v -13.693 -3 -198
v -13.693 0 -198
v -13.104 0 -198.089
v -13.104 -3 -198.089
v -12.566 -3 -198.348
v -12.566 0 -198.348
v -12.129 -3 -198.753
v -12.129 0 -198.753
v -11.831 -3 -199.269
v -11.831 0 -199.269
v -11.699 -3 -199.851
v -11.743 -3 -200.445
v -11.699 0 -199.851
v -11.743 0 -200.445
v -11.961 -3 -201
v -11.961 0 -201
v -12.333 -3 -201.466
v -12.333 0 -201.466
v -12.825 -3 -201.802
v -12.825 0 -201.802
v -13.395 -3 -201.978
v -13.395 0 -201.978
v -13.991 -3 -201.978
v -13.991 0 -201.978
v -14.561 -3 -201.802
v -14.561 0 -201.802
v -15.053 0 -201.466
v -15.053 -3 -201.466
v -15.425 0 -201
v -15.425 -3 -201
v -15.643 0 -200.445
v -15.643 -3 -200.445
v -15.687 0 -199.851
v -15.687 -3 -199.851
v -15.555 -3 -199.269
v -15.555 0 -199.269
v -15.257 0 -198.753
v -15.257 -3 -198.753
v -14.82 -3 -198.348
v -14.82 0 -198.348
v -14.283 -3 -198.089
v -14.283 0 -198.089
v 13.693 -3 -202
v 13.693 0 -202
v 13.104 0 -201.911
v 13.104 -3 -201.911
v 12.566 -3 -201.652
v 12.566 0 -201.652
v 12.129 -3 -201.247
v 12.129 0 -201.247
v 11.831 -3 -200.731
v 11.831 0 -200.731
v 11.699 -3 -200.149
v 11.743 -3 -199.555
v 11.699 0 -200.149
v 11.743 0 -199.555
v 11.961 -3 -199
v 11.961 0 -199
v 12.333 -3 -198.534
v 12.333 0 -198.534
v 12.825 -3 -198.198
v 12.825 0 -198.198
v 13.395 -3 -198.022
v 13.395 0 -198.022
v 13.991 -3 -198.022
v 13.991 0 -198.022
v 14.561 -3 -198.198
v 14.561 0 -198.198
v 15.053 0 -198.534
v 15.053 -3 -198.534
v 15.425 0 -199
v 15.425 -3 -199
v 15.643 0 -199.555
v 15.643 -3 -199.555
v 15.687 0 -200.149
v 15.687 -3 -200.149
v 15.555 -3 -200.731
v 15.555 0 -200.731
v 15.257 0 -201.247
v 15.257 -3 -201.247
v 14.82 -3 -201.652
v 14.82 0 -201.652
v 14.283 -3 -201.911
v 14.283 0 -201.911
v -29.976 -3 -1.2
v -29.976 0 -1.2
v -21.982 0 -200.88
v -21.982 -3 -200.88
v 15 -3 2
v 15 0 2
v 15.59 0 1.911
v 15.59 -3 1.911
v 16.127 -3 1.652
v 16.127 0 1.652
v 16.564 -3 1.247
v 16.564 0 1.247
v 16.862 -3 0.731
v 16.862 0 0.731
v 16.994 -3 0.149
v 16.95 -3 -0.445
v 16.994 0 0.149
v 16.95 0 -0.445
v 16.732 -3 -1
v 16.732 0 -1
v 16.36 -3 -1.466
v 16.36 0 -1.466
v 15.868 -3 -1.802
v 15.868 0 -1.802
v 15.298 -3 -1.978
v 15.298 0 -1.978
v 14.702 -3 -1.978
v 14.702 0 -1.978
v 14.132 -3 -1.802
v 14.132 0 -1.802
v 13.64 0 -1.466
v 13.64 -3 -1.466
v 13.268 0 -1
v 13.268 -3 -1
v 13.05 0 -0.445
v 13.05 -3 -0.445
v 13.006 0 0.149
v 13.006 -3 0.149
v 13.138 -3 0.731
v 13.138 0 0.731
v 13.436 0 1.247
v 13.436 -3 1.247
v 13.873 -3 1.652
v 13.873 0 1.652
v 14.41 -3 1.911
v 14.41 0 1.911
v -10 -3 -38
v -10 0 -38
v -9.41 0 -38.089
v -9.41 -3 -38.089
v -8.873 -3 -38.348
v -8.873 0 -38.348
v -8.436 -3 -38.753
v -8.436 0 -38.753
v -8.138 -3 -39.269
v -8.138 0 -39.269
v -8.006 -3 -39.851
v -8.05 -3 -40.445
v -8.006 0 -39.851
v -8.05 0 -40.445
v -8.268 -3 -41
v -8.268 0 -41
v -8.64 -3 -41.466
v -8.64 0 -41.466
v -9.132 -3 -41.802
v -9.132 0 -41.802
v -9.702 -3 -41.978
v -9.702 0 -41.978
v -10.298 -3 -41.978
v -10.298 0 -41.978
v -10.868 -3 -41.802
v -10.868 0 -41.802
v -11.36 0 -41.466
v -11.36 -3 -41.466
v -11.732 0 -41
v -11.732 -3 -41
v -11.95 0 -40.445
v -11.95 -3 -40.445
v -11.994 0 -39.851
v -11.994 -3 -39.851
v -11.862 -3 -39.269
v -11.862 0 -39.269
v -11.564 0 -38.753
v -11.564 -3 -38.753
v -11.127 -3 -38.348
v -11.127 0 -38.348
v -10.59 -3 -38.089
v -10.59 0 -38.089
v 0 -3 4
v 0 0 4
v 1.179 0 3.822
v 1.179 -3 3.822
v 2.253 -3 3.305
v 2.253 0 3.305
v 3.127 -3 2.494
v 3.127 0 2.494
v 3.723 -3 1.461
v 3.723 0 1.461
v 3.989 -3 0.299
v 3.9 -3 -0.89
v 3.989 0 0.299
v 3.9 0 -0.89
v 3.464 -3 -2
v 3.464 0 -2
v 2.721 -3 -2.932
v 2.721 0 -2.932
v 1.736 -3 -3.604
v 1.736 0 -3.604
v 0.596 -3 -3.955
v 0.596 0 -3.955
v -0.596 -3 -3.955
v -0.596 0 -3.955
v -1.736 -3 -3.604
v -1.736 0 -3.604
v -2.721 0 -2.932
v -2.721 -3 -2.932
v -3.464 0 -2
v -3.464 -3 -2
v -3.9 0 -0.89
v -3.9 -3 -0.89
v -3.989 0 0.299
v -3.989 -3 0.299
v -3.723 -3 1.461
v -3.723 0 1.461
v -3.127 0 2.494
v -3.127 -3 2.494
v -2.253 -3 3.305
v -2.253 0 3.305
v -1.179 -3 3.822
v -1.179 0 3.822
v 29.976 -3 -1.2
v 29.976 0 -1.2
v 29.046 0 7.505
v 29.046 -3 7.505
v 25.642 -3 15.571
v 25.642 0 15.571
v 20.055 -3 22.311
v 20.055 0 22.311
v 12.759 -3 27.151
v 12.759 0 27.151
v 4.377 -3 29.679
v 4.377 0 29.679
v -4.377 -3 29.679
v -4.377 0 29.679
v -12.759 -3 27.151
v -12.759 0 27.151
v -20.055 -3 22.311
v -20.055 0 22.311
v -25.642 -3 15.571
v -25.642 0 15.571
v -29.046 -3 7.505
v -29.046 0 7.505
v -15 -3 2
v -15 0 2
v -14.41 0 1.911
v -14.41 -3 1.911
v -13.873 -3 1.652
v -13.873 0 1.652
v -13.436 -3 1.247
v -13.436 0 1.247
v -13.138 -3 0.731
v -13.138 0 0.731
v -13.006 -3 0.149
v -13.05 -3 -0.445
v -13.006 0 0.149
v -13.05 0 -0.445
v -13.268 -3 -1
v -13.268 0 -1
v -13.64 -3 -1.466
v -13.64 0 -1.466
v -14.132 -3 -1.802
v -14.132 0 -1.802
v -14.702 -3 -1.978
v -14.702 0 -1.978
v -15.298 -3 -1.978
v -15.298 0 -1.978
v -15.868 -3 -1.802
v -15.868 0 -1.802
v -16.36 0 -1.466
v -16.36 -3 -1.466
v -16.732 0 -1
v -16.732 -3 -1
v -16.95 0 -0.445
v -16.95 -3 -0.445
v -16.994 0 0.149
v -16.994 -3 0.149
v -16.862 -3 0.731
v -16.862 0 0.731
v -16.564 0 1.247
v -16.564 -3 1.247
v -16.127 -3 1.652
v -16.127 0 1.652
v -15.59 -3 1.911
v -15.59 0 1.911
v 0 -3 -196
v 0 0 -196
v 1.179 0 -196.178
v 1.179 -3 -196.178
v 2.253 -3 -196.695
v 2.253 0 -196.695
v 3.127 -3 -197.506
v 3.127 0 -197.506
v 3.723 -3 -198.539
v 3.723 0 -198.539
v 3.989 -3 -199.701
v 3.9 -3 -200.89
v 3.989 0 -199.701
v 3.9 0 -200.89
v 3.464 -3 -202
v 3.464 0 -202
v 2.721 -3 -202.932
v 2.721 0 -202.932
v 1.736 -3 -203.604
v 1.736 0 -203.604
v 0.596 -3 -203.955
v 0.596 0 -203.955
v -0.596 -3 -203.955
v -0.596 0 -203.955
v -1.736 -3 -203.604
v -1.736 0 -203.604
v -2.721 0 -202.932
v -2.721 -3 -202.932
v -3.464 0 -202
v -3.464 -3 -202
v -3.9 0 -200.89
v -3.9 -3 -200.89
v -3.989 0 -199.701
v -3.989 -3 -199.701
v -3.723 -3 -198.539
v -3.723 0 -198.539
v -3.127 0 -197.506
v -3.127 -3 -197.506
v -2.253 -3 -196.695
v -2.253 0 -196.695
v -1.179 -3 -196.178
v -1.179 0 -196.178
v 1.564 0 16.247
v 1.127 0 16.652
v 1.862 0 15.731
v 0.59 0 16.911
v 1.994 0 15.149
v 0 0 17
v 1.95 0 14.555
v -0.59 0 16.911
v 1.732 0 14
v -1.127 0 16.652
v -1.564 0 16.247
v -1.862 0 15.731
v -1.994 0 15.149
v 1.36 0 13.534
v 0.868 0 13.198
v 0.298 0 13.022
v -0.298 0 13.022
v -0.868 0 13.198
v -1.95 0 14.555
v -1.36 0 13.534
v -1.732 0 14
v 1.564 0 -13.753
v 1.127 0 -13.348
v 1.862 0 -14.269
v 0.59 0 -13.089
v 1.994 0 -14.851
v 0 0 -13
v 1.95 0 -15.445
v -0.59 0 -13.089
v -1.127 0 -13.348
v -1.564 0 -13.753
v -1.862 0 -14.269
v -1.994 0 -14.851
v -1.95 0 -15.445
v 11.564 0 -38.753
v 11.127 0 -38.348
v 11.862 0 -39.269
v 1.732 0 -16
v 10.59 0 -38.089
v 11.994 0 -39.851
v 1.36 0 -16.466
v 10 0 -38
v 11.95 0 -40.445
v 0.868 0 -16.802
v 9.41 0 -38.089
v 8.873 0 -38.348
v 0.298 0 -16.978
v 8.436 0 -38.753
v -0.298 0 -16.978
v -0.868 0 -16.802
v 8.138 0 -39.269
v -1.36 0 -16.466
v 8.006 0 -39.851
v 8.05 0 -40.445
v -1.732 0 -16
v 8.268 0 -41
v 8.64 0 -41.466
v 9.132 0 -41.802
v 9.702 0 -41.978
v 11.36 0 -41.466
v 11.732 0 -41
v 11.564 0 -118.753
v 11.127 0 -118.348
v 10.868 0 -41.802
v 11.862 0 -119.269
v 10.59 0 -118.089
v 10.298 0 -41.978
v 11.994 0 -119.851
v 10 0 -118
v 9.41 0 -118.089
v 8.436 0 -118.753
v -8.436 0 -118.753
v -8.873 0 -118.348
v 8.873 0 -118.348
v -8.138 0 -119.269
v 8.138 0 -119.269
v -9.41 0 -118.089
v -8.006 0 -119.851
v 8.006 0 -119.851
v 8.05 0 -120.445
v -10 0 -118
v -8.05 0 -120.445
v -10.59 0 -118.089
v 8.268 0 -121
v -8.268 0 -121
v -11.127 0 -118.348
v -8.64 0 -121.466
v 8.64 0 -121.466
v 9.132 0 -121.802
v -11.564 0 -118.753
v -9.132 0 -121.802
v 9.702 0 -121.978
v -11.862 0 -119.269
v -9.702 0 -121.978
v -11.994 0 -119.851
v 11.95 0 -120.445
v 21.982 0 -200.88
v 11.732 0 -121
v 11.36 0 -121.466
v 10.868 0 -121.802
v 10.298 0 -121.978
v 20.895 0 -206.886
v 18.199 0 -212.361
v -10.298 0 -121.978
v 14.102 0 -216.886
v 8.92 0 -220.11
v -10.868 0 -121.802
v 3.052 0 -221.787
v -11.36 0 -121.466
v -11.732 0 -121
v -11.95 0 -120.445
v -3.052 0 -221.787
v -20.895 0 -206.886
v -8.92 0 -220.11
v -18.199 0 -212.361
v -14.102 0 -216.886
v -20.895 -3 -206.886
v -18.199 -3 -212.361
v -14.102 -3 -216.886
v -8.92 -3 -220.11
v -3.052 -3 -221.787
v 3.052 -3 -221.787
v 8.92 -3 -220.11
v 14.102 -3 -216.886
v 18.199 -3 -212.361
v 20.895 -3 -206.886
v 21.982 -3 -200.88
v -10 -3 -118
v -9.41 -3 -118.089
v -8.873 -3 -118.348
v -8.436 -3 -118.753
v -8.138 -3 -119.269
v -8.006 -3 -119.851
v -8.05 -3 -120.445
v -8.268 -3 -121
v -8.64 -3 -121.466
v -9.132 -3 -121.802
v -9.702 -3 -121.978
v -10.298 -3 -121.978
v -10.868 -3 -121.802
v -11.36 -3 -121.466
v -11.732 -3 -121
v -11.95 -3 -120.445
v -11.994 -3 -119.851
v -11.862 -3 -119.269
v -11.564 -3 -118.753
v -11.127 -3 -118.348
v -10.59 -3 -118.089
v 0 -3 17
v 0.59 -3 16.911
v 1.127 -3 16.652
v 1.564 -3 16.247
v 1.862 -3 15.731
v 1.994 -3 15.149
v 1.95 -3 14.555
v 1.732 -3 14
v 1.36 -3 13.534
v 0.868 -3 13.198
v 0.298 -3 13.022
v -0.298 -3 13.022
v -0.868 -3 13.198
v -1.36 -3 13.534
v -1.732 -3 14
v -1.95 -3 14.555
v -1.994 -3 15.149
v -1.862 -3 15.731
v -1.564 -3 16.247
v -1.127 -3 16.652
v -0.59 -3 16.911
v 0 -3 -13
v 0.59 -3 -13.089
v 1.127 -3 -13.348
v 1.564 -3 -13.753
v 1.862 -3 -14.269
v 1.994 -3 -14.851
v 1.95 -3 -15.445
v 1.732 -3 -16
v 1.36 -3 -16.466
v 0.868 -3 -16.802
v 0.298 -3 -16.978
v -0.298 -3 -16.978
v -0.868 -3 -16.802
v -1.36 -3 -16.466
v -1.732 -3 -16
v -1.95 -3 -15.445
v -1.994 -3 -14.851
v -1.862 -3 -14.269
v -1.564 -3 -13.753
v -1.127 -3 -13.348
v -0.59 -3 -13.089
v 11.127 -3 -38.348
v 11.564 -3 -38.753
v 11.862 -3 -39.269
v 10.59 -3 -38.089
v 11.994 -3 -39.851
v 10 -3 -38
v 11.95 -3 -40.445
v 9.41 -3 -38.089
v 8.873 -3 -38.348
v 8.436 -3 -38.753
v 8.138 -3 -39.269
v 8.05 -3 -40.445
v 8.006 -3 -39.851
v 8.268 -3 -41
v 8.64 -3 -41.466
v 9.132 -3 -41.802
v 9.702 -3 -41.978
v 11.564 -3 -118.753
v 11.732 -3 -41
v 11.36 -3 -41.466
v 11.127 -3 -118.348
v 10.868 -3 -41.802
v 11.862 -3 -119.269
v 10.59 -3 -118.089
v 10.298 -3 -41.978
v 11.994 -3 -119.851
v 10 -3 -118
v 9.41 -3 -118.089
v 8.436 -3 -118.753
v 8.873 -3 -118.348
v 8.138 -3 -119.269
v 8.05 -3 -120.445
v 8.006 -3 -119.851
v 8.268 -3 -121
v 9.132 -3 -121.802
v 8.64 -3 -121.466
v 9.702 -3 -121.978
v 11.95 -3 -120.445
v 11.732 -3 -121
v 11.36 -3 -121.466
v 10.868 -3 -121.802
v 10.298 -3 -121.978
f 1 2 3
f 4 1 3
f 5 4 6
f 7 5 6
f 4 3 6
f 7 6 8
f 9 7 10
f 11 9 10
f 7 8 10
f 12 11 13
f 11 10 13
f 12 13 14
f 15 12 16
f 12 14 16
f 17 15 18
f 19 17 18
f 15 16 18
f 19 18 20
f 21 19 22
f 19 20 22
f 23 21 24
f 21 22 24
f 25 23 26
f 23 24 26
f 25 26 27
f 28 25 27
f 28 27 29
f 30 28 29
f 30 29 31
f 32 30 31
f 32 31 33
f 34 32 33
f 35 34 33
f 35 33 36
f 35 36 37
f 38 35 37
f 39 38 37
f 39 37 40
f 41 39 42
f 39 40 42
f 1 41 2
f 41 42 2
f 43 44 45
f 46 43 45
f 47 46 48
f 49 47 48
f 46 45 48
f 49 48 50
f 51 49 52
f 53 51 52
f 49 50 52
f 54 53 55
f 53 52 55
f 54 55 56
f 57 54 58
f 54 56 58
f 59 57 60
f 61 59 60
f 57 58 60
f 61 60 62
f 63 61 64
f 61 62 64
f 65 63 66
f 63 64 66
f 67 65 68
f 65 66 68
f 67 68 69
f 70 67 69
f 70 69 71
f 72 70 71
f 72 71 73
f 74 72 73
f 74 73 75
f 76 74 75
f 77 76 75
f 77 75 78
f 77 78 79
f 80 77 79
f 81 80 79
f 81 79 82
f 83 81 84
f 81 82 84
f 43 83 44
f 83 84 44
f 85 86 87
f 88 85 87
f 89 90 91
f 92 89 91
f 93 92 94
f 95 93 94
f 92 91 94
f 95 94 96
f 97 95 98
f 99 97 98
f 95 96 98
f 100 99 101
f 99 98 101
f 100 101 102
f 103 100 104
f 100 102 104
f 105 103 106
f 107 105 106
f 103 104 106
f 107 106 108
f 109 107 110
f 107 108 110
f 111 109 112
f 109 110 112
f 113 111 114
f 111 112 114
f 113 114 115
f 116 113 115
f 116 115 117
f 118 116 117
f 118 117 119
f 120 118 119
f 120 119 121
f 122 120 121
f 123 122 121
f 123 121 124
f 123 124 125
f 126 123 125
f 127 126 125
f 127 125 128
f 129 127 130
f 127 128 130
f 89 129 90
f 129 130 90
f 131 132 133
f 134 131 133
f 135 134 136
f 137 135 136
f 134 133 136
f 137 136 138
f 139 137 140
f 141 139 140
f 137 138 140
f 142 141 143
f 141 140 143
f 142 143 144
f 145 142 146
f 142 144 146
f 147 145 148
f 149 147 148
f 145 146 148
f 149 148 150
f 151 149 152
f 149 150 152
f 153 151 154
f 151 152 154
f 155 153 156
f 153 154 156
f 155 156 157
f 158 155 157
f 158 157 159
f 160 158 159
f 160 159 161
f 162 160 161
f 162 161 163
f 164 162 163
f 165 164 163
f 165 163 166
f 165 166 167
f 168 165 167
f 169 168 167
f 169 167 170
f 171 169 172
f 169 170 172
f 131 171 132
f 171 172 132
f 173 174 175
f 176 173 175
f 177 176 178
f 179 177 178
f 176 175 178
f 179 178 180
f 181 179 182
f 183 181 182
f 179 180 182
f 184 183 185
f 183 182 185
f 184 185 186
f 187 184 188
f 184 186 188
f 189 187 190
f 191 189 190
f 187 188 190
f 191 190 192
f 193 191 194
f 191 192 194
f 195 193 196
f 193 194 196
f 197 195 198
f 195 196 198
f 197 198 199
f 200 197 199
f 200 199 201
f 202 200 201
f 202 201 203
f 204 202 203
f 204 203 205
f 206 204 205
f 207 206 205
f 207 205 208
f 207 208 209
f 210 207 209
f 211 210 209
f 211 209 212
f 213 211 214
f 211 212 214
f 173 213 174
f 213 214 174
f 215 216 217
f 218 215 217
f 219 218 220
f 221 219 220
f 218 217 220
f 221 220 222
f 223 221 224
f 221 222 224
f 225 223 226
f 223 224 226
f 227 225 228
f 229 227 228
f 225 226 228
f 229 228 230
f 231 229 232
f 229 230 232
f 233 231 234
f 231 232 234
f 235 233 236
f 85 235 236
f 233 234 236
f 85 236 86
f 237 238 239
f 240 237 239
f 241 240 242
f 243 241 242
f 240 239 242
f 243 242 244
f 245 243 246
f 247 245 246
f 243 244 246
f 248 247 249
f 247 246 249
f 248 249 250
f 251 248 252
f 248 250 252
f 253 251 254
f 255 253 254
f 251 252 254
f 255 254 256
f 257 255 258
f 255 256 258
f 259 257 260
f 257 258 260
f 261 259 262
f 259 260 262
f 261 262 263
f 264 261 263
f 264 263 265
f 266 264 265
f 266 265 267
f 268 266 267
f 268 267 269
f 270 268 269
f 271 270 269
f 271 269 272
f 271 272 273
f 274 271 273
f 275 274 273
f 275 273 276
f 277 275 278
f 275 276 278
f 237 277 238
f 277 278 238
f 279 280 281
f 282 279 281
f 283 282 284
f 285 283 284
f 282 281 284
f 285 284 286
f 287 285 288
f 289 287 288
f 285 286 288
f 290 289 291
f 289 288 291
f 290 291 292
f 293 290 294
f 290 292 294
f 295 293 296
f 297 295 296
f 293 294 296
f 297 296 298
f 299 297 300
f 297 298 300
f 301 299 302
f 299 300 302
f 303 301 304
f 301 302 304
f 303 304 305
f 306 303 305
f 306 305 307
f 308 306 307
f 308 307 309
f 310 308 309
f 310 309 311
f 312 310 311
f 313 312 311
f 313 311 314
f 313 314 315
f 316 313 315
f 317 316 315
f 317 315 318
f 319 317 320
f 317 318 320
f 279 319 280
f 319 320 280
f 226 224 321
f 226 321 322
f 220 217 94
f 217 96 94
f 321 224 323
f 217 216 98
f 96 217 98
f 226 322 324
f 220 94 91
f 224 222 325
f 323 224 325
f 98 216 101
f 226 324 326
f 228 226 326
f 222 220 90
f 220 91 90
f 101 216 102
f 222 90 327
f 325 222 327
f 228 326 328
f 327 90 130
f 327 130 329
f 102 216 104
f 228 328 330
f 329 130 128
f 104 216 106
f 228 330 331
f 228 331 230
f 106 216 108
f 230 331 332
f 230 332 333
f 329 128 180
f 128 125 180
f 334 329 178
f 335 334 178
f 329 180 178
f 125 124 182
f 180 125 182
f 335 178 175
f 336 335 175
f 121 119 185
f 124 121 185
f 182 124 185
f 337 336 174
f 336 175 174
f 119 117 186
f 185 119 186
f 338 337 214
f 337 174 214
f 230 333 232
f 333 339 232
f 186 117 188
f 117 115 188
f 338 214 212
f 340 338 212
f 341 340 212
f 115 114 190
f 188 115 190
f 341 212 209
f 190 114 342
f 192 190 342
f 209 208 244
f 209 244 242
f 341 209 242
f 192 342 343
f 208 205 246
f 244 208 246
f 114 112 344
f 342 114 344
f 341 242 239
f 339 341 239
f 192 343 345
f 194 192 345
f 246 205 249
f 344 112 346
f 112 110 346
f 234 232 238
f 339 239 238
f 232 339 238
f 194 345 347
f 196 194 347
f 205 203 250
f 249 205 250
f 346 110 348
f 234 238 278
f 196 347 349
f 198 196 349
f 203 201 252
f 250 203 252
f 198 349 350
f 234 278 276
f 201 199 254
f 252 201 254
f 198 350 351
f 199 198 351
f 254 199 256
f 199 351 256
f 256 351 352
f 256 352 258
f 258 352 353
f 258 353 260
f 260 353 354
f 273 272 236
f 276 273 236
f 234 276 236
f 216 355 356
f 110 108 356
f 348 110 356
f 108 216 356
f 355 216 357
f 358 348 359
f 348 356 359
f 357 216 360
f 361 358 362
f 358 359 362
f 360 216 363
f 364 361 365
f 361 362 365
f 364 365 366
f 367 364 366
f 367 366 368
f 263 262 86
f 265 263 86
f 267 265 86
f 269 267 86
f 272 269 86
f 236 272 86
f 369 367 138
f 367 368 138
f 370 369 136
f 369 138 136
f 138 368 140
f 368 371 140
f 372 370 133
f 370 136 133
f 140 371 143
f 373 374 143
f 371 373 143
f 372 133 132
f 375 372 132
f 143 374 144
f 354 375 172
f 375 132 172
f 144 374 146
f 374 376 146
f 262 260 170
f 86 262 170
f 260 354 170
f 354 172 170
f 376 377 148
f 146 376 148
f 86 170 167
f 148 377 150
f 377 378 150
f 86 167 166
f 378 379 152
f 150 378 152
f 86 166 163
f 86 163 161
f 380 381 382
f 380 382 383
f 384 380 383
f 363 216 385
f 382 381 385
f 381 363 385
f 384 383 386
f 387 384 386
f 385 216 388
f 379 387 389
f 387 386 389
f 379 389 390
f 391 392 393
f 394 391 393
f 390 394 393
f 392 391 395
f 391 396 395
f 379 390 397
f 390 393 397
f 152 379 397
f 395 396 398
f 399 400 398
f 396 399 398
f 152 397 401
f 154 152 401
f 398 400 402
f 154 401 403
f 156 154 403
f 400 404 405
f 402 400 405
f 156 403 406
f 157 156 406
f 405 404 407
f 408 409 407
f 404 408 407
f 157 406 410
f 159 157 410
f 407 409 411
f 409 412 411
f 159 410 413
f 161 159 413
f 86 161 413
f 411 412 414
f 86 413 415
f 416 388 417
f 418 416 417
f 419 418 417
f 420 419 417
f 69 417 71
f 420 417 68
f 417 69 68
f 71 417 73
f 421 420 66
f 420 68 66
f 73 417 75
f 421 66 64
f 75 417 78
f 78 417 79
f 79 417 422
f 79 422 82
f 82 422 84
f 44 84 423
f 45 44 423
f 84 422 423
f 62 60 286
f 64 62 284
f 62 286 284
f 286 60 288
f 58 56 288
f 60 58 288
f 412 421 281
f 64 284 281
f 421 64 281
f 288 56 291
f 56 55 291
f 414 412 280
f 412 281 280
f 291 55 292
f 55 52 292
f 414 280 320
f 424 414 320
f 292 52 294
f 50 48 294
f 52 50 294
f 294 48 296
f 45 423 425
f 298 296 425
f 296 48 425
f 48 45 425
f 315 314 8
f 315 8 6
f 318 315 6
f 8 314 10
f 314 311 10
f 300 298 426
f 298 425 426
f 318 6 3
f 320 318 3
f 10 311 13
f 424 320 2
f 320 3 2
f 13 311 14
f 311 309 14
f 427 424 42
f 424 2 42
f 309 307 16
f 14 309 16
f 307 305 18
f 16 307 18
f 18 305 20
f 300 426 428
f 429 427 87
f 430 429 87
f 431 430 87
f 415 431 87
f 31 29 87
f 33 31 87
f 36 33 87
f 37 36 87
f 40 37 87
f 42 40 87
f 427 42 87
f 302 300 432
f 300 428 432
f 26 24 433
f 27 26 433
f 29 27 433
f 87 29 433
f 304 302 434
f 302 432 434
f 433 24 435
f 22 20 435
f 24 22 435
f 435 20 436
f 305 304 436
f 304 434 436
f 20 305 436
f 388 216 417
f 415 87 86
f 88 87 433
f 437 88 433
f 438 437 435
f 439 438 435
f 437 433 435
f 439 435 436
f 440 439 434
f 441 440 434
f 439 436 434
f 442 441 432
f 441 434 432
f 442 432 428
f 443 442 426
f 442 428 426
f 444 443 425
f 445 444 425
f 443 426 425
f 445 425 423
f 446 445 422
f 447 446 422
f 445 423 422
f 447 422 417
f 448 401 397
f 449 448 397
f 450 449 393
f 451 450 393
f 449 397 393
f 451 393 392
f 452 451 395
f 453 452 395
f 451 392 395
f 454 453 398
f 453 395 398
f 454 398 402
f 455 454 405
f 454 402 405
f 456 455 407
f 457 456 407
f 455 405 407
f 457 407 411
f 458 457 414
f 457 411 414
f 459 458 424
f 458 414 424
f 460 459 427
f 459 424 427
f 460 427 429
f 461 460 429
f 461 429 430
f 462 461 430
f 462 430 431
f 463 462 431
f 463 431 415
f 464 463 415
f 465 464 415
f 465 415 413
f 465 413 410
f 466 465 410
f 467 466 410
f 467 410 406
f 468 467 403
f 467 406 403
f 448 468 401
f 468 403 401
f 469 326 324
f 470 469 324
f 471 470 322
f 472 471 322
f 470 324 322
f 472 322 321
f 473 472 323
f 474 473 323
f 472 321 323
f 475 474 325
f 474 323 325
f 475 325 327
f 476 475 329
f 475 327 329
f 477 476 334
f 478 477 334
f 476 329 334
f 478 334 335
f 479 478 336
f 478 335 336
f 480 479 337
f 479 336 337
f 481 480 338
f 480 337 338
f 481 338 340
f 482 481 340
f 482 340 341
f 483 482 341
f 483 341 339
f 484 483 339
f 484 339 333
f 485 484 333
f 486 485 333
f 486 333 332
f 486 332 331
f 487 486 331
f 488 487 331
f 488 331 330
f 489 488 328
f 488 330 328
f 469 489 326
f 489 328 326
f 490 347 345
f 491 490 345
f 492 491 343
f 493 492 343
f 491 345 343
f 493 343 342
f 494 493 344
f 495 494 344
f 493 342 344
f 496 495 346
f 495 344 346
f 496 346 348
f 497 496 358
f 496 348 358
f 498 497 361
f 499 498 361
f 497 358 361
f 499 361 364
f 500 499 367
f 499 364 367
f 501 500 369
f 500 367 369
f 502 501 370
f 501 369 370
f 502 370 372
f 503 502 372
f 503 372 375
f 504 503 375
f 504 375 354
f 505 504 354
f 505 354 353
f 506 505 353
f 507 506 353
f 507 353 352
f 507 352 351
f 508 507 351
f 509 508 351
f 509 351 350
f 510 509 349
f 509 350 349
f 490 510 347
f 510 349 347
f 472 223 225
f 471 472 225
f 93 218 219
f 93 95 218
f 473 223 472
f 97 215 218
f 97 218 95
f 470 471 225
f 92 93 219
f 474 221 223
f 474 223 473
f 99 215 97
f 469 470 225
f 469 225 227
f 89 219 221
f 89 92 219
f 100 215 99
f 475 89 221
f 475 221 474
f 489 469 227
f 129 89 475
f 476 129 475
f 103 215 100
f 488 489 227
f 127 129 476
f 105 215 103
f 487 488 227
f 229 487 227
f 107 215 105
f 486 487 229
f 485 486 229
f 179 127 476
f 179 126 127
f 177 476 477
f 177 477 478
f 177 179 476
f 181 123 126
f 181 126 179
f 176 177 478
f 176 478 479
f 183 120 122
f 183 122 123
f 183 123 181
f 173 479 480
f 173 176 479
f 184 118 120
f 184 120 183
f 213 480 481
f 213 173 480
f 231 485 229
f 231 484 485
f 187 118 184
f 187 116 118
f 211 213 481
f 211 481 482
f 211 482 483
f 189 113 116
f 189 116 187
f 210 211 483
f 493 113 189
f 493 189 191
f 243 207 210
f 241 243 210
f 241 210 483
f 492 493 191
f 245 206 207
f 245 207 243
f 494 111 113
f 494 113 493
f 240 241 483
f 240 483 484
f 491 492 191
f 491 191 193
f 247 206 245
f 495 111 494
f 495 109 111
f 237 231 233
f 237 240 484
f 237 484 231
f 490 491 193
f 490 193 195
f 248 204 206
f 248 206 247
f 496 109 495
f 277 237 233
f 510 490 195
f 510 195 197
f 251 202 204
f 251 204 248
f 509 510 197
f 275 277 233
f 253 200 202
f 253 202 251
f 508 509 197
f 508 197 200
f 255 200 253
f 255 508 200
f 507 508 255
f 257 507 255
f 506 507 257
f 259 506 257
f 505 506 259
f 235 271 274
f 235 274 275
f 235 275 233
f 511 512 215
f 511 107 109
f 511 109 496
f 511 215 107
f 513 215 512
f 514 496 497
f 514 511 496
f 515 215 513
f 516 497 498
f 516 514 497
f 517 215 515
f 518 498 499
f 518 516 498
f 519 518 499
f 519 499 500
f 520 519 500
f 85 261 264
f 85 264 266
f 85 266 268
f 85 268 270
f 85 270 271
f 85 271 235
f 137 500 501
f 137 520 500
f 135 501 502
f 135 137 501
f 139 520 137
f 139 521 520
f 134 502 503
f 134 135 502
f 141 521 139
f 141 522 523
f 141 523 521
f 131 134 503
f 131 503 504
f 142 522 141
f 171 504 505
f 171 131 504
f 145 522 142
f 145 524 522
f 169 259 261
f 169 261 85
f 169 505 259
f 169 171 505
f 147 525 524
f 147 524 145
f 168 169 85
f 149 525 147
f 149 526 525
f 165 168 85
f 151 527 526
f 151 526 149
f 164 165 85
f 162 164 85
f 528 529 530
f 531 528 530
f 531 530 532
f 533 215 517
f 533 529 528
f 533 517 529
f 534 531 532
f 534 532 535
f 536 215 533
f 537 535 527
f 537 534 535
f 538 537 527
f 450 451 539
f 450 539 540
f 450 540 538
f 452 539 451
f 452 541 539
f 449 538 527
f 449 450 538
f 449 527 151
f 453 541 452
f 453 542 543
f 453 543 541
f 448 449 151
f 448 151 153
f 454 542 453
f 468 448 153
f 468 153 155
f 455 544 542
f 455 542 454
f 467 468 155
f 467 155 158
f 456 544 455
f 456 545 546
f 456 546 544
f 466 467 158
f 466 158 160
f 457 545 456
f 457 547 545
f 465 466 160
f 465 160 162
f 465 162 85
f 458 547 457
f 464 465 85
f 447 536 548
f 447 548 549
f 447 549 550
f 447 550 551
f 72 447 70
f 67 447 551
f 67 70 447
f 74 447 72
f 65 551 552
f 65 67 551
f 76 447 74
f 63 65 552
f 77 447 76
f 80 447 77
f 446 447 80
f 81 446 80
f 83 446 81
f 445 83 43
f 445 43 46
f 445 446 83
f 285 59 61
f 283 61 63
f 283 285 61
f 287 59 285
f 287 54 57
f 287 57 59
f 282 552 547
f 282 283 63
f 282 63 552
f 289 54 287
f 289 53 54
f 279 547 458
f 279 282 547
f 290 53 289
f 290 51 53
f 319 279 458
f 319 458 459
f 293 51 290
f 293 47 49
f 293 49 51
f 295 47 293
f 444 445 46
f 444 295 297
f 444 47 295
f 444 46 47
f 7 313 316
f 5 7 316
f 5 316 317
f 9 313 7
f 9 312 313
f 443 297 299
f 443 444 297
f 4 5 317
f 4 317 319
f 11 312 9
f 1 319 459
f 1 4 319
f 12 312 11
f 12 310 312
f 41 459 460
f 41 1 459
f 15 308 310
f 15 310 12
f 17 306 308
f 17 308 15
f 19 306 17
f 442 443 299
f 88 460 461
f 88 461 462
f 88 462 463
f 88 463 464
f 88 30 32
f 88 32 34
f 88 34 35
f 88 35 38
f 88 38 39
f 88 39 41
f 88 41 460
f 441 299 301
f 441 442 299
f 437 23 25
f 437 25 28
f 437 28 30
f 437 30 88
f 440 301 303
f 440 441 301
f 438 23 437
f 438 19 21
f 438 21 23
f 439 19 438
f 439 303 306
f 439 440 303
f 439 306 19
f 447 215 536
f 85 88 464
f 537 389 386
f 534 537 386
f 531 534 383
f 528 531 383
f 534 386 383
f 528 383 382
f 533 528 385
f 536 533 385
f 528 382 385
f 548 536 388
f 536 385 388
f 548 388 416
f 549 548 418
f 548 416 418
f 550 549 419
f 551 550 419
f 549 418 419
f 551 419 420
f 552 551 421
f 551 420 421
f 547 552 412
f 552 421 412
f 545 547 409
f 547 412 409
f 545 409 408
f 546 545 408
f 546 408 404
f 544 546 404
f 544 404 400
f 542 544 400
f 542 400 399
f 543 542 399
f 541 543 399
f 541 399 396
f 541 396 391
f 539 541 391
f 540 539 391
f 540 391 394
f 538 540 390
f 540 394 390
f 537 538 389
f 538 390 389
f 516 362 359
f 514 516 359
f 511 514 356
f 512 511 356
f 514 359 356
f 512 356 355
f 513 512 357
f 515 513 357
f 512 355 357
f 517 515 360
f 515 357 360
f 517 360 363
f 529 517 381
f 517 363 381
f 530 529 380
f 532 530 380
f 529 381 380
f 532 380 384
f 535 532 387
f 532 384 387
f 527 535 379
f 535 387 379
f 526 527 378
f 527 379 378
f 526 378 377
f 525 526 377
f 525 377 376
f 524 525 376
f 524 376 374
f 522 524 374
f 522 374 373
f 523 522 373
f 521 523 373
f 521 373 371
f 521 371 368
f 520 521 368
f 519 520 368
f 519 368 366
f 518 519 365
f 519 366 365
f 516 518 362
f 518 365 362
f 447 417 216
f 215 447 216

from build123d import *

# Parameters (mm, degrees)
SKETCH_1_R             = 4
SKETCH_1_R_2           = 2
SM_BASE_FLANGE_1_DEPTH = 3


# Sheet-metal steps are written as plain solids
with BuildPart() as part:
    # Sketch 1 → 基体-法兰1 (new body)
    with BuildSketch(Plane(origin=(0, 0, 0), x_dir=(1, 0, 0), z_dir=(0, 1, 0))):
        with BuildLine():
            Line((21.982392954, 200.88), (29.975990392, 1.2))
            ThreePointArc((29.975990392, 1.2), (0, -30), (-29.975990392, 1.2))
            Line((-29.975990392, 1.2), (-21.982392954, 200.88))
            ThreePointArc((-21.982392954, 200.88), (0, 222), (21.982392954, 200.88))
        make_face()
        with Locations(Location((0, 0, 0), (0, 0, 270))):
            Circle(SKETCH_1_R, mode=Mode.SUBTRACT)
        with Locations(Location((0, 200, 0), (0, 0, 270))):
            Circle(SKETCH_1_R, mode=Mode.SUBTRACT)
        with Locations(Location((10, 120, 0), (0, 0, 270))):
            Circle(SKETCH_1_R_2, mode=Mode.SUBTRACT)
        with Locations(Location((-10, 120, 0), (0, 0, 270))):
            Circle(SKETCH_1_R_2, mode=Mode.SUBTRACT)
        with Locations(Location((10, 40, 0), (0, 0, 270))):
            Circle(SKETCH_1_R_2, mode=Mode.SUBTRACT)
        with Locations(Location((-10, 40, 0), (0, 0, 270))):
            Circle(SKETCH_1_R_2, mode=Mode.SUBTRACT)
        with Locations(Location((0, 15, 0), (0, 0, 270))):
            Circle(SKETCH_1_R_2, mode=Mode.SUBTRACT)
        with Locations(Location((15, 0, 0), (0, 0, 270))):
            Circle(SKETCH_1_R_2, mode=Mode.SUBTRACT)
        with Locations(Location((0, -15, 0), (0, 0, 270))):
            Circle(SKETCH_1_R_2, mode=Mode.SUBTRACT)
        with Locations(Location((-15, 0, 0), (0, 0, 270))):
            Circle(SKETCH_1_R_2, mode=Mode.SUBTRACT)
        with Locations(Location((-13.693032158, 200, 0), (0, 0, 270))):
            Circle(SKETCH_1_R_2, mode=Mode.SUBTRACT)
        with Locations(Location((13.693032158, 200, 0), (0, 0, 90))):
            Circle(SKETCH_1_R_2, mode=Mode.SUBTRACT)
    extrude(amount=-SM_BASE_FLANGE_1_DEPTH)


solid = part.part
